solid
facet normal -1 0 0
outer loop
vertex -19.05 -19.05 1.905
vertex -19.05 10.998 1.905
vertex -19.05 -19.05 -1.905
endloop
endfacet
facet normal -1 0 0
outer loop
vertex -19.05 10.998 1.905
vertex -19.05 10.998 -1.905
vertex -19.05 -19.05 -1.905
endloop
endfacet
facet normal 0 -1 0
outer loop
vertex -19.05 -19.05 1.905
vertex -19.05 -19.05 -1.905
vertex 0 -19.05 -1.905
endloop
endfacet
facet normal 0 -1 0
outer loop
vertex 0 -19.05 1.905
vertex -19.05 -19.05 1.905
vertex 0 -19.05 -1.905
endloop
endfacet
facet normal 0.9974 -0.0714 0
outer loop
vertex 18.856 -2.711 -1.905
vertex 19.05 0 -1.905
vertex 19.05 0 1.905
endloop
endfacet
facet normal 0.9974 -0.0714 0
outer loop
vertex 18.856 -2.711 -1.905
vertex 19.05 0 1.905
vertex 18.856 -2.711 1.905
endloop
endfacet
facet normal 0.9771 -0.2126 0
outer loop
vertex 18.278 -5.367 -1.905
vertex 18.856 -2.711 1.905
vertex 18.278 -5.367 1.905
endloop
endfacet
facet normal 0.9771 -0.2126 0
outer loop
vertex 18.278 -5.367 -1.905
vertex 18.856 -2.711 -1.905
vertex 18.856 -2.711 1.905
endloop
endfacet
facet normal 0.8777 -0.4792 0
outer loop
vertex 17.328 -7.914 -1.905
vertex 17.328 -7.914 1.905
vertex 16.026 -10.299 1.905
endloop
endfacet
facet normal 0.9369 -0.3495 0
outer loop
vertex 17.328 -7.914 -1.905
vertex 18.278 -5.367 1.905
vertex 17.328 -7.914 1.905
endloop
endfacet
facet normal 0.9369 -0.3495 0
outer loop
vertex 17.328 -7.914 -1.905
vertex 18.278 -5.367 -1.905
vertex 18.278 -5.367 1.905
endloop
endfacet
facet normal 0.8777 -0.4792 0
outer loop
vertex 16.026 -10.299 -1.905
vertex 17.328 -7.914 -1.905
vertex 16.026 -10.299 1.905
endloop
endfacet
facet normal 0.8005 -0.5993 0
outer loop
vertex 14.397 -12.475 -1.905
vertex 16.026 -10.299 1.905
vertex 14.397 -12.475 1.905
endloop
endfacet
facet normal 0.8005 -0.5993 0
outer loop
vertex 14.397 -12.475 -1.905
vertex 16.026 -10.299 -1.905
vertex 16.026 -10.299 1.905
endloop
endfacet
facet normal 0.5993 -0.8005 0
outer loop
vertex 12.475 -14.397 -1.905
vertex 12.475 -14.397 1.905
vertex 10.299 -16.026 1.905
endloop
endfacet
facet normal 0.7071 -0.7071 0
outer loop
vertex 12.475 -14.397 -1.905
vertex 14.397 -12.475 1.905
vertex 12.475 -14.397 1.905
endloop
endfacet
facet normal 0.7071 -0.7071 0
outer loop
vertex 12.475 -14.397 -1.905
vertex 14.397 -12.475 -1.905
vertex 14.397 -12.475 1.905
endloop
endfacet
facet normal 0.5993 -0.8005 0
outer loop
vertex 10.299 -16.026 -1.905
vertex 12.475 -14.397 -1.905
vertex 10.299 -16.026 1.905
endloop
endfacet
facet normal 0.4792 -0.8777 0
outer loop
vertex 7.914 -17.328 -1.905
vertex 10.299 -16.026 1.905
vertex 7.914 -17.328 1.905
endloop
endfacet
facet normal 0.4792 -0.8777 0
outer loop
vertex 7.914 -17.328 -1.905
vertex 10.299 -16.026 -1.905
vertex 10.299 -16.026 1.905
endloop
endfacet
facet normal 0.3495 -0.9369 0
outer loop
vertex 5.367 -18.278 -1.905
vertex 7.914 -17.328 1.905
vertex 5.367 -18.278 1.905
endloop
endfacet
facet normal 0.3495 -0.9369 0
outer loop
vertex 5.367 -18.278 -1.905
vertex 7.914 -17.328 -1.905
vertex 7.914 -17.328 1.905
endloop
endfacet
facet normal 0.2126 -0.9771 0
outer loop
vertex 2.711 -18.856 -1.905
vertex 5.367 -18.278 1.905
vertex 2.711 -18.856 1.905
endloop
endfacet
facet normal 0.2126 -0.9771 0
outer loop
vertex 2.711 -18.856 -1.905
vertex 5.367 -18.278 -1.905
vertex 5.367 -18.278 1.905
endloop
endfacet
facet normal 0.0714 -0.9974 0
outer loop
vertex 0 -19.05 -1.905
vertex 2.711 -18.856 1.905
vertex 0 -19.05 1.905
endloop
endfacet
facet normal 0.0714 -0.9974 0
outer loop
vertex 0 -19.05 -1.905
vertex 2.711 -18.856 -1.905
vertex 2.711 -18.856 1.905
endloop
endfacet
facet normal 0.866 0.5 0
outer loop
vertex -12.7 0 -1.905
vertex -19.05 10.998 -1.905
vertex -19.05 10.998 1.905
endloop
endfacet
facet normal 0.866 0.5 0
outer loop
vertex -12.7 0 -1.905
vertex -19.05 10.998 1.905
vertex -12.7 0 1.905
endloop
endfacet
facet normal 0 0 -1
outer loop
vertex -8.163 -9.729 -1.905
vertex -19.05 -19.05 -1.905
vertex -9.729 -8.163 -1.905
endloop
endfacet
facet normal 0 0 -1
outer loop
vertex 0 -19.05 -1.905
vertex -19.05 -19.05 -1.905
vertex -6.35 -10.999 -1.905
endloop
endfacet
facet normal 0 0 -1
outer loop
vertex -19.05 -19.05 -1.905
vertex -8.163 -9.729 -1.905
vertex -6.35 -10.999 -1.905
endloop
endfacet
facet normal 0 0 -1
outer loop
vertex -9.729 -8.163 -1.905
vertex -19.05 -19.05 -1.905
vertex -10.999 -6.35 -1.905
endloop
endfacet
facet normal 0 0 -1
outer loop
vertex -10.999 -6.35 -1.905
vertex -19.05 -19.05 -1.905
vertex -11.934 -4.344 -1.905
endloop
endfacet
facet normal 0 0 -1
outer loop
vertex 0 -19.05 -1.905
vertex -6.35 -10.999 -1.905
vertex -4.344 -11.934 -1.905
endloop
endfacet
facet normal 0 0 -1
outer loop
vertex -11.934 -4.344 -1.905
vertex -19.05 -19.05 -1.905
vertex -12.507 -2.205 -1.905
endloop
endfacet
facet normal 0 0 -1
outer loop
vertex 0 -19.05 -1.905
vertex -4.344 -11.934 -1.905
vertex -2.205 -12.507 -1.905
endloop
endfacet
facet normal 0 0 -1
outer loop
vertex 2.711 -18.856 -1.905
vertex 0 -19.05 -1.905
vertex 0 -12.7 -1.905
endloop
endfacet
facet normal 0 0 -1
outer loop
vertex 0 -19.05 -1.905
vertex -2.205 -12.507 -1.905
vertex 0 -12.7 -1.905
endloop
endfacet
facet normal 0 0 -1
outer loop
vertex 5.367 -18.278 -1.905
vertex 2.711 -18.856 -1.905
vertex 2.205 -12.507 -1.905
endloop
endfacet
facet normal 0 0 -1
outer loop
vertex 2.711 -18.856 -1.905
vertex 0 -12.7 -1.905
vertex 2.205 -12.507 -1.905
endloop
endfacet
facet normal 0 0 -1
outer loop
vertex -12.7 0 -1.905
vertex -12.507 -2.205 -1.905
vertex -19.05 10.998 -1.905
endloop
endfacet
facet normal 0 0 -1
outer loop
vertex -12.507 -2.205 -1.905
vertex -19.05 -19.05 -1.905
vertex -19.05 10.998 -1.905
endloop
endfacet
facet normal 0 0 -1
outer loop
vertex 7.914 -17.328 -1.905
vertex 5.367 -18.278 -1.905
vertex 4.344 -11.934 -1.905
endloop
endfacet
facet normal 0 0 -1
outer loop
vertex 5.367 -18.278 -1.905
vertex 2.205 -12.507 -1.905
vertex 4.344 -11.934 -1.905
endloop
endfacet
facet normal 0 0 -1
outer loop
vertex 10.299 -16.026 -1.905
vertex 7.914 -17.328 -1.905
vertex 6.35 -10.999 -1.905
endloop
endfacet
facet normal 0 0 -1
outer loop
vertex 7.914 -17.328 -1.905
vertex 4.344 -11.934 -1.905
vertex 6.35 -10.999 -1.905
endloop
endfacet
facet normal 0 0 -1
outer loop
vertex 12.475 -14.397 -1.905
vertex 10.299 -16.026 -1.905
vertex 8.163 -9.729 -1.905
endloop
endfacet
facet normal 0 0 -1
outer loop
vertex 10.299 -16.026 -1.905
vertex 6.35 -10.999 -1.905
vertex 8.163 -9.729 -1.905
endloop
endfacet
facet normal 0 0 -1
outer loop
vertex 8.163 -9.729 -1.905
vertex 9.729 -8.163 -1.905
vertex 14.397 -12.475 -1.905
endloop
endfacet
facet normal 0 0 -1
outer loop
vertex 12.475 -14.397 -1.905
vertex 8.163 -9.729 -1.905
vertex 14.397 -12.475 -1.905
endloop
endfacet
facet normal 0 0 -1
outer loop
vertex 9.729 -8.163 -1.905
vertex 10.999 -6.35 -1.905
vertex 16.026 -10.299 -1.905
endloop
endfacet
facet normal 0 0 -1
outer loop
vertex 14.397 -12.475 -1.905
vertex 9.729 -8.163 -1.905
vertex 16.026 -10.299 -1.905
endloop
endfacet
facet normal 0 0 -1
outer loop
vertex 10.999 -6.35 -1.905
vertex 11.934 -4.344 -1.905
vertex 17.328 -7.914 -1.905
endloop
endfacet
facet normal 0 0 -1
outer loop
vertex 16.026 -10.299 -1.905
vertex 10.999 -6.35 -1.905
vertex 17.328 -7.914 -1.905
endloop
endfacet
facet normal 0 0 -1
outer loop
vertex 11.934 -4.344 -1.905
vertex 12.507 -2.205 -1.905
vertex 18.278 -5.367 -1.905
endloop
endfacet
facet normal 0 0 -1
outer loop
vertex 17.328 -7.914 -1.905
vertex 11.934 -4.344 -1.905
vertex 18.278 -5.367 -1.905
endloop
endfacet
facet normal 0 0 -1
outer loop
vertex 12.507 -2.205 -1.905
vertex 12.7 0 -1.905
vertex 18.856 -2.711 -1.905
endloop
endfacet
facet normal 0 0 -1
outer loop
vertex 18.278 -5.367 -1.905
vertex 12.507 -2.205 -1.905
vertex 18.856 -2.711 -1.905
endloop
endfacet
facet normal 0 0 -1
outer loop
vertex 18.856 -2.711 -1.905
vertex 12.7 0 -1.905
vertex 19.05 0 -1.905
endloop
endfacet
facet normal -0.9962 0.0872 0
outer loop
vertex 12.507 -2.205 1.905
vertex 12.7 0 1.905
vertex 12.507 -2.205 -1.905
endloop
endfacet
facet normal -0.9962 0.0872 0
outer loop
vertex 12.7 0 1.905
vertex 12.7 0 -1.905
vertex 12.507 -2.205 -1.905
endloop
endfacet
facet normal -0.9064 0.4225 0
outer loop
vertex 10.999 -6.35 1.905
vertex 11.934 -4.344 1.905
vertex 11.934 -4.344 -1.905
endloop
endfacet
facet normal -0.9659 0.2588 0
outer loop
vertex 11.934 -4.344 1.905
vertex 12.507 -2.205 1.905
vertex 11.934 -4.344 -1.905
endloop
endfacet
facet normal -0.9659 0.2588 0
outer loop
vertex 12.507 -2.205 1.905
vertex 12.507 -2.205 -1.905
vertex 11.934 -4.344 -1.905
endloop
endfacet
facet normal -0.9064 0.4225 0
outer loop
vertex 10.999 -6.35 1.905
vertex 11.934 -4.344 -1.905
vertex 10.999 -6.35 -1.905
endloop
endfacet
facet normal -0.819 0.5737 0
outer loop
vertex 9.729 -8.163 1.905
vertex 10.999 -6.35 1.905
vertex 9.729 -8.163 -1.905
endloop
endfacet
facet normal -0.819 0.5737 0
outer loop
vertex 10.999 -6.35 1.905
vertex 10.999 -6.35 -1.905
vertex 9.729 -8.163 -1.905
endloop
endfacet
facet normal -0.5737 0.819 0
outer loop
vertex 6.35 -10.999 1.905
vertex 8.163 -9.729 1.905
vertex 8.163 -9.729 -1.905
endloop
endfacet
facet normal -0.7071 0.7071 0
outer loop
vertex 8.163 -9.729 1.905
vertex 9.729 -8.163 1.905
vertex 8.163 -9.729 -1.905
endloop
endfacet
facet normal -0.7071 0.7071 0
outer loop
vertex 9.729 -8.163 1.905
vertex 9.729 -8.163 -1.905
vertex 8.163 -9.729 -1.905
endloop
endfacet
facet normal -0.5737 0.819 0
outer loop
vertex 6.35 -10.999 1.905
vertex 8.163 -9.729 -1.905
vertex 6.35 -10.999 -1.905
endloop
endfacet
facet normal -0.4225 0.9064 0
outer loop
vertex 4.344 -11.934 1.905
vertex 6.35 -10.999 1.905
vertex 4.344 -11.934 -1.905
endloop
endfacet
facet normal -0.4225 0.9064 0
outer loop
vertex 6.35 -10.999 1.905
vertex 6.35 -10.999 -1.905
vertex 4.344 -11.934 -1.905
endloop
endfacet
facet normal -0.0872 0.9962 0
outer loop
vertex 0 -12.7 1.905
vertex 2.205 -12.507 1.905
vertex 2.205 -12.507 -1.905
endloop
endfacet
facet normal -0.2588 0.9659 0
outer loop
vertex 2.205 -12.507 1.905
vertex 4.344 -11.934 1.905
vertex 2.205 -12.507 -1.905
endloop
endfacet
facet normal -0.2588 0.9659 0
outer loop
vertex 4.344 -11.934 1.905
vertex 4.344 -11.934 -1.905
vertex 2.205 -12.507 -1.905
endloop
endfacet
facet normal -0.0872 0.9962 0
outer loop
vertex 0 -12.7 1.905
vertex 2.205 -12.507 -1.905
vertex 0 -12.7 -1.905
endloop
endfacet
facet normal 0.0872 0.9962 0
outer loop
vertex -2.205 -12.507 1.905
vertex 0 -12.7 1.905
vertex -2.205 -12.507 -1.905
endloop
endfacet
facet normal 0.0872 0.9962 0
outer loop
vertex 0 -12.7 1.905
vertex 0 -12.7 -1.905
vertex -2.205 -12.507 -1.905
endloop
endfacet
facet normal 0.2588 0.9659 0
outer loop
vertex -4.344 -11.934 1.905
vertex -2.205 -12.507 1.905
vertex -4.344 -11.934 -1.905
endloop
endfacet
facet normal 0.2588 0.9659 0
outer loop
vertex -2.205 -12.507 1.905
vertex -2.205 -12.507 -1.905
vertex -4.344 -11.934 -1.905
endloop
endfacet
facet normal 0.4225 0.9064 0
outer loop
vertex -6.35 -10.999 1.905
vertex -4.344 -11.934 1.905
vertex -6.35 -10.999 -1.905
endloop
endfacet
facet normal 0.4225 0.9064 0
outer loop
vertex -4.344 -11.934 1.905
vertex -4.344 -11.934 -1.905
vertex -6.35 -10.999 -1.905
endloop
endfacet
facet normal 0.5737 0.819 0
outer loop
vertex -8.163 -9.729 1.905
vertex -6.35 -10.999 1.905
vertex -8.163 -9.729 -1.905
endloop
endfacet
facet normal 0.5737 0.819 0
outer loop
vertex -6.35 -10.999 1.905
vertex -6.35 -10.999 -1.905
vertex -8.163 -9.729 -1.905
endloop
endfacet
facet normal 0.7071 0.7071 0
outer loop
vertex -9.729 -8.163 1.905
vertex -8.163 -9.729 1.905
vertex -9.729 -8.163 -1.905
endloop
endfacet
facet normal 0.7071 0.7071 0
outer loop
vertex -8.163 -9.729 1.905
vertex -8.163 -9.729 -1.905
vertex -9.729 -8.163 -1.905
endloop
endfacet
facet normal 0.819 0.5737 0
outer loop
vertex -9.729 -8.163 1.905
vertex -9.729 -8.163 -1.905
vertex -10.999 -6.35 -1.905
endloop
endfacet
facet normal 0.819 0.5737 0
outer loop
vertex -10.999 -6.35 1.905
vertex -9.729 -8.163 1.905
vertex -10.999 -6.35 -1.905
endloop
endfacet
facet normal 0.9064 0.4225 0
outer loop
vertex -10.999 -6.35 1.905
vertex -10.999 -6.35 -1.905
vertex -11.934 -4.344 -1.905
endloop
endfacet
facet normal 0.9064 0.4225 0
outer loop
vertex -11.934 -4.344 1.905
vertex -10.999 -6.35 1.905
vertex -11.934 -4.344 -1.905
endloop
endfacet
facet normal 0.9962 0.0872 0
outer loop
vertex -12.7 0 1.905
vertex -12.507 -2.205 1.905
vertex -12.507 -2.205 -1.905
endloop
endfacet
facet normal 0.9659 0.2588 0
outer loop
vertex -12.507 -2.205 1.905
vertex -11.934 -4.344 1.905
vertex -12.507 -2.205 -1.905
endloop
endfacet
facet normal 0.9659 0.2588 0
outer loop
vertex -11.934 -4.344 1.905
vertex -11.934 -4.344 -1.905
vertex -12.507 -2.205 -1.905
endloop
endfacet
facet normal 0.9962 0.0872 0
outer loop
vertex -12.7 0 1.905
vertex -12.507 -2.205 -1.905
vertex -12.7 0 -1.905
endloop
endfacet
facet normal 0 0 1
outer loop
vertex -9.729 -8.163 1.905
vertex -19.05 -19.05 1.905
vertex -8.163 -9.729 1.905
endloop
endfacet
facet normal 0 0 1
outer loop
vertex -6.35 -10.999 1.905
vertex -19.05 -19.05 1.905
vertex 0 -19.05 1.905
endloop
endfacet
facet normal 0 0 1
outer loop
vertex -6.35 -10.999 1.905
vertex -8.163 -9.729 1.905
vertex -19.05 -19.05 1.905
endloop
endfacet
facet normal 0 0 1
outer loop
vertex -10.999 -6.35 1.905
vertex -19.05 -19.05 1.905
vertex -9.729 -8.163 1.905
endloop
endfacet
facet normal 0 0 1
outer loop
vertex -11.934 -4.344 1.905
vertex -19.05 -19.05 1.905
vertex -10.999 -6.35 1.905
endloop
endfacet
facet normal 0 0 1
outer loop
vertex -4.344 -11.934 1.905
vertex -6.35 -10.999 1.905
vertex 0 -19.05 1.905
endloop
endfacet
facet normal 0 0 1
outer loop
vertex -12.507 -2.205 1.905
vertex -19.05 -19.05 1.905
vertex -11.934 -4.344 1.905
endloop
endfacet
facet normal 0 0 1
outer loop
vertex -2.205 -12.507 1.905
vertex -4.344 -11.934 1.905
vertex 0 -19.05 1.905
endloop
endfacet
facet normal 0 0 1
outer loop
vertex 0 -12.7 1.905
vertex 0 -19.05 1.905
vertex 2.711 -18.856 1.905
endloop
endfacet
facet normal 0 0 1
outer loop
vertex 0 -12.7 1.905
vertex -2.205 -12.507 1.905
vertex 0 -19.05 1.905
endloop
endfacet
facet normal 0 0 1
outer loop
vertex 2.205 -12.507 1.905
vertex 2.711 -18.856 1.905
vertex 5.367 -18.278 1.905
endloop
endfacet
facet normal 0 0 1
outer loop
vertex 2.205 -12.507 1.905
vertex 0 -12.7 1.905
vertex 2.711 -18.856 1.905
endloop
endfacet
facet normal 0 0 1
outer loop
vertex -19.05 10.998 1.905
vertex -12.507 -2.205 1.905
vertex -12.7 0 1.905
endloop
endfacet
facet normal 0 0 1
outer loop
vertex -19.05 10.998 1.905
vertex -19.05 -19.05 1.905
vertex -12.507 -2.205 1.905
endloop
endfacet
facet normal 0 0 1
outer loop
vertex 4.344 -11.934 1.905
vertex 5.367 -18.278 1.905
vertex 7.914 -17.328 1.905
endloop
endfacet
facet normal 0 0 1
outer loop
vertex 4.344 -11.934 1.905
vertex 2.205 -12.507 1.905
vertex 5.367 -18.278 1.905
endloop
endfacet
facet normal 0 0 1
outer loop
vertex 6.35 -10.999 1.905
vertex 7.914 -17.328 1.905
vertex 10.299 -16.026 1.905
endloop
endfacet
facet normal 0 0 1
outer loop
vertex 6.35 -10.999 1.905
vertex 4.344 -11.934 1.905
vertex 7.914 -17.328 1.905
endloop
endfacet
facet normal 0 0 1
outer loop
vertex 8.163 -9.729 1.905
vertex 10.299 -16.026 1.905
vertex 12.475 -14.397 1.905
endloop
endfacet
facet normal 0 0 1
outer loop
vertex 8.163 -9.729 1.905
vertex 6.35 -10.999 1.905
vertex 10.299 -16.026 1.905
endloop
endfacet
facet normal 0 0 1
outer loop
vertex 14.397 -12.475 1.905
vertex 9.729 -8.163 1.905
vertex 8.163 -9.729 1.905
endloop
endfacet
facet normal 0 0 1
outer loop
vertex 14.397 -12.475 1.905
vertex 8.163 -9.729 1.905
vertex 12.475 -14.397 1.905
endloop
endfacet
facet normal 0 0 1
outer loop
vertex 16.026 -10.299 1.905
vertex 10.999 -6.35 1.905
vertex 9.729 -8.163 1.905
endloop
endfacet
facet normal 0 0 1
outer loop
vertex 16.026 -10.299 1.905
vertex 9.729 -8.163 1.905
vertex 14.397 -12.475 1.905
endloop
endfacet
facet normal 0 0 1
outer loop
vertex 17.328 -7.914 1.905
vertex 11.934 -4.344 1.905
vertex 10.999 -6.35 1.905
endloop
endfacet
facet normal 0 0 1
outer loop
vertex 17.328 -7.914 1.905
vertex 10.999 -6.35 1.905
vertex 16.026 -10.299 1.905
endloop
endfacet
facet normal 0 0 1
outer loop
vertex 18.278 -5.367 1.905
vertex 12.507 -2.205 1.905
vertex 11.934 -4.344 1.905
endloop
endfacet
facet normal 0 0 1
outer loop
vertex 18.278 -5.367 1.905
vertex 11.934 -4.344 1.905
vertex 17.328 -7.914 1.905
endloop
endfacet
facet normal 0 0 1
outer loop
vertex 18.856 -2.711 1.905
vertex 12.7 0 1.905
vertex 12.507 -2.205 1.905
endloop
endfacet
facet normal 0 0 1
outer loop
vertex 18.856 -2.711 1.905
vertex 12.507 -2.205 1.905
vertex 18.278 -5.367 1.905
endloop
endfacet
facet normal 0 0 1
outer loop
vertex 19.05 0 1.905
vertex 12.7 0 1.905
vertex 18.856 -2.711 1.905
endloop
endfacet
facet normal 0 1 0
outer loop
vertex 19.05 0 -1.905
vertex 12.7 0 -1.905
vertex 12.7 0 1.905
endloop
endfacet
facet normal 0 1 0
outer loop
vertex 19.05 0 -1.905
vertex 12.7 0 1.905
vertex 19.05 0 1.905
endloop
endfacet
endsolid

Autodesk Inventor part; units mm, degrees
ref_plane "YZ Plane" through (0, 0, 0) normal (1, 0, 0) x (0, 1, 0)
ref_plane "XZ Plane" through (0, 0, 0) normal (0, 1, 0) x (-1, 0, 0)
ref_plane "XY Plane" through (0, 0, 0) normal (0, 0, 1) x (1, 0, 0)
sketch "Sketch1" plane through (0, 0, 0) normal (0, 0, 1) x (1, 0, 0)
  arc A0 (0, -19.05) -> (19.05, 0) centre (0, 0) ccw
  arc A1 (-12.7, 0) -> (12.7, 0) centre (0, 0) ccw
  line L0 (-19.05, 0) -> (19.05, 0) construction
  line L1 (-19.05, 0) -> (-19.05, -19.05)
  line L2 (-19.05, -19.05) -> (0, -19.05)
  line L3 (-19.05, 0) -> (-12.7, 0)
  line L4 (12.7, 0) -> (19.05, 0)
  circle A2 centre (0, 0) radius 19.05 construction
  dimension "d0" = 38.1
  dimension "d1" = 25.4
extrude "Extrusion1" add sketch "Sketch1" along normal mid plane 3.81
sketch "Sketch2" plane through (0, 0, 0) normal (0, 0, 1) x (1, 0, 0)
  line L0 (-19.05, 0) -> (-12.7, 0) projected
  line L1 (-19.05, -19.05) -> (-19.05, 0) projected
  line L2 (-19.05, 0) -> (-19.05, 10.9985)
  line L3 (-19.05, 10.9985) -> (-12.7, 0)
  line L4 (-12.7, 0) -> (-19.05, 0)
  point P0 (0, 0)
  dimension "d5" = 60
extrude "Extrusion2" add sketch "Sketch2" along normal mid plane 3.81
properties part number "hook"
